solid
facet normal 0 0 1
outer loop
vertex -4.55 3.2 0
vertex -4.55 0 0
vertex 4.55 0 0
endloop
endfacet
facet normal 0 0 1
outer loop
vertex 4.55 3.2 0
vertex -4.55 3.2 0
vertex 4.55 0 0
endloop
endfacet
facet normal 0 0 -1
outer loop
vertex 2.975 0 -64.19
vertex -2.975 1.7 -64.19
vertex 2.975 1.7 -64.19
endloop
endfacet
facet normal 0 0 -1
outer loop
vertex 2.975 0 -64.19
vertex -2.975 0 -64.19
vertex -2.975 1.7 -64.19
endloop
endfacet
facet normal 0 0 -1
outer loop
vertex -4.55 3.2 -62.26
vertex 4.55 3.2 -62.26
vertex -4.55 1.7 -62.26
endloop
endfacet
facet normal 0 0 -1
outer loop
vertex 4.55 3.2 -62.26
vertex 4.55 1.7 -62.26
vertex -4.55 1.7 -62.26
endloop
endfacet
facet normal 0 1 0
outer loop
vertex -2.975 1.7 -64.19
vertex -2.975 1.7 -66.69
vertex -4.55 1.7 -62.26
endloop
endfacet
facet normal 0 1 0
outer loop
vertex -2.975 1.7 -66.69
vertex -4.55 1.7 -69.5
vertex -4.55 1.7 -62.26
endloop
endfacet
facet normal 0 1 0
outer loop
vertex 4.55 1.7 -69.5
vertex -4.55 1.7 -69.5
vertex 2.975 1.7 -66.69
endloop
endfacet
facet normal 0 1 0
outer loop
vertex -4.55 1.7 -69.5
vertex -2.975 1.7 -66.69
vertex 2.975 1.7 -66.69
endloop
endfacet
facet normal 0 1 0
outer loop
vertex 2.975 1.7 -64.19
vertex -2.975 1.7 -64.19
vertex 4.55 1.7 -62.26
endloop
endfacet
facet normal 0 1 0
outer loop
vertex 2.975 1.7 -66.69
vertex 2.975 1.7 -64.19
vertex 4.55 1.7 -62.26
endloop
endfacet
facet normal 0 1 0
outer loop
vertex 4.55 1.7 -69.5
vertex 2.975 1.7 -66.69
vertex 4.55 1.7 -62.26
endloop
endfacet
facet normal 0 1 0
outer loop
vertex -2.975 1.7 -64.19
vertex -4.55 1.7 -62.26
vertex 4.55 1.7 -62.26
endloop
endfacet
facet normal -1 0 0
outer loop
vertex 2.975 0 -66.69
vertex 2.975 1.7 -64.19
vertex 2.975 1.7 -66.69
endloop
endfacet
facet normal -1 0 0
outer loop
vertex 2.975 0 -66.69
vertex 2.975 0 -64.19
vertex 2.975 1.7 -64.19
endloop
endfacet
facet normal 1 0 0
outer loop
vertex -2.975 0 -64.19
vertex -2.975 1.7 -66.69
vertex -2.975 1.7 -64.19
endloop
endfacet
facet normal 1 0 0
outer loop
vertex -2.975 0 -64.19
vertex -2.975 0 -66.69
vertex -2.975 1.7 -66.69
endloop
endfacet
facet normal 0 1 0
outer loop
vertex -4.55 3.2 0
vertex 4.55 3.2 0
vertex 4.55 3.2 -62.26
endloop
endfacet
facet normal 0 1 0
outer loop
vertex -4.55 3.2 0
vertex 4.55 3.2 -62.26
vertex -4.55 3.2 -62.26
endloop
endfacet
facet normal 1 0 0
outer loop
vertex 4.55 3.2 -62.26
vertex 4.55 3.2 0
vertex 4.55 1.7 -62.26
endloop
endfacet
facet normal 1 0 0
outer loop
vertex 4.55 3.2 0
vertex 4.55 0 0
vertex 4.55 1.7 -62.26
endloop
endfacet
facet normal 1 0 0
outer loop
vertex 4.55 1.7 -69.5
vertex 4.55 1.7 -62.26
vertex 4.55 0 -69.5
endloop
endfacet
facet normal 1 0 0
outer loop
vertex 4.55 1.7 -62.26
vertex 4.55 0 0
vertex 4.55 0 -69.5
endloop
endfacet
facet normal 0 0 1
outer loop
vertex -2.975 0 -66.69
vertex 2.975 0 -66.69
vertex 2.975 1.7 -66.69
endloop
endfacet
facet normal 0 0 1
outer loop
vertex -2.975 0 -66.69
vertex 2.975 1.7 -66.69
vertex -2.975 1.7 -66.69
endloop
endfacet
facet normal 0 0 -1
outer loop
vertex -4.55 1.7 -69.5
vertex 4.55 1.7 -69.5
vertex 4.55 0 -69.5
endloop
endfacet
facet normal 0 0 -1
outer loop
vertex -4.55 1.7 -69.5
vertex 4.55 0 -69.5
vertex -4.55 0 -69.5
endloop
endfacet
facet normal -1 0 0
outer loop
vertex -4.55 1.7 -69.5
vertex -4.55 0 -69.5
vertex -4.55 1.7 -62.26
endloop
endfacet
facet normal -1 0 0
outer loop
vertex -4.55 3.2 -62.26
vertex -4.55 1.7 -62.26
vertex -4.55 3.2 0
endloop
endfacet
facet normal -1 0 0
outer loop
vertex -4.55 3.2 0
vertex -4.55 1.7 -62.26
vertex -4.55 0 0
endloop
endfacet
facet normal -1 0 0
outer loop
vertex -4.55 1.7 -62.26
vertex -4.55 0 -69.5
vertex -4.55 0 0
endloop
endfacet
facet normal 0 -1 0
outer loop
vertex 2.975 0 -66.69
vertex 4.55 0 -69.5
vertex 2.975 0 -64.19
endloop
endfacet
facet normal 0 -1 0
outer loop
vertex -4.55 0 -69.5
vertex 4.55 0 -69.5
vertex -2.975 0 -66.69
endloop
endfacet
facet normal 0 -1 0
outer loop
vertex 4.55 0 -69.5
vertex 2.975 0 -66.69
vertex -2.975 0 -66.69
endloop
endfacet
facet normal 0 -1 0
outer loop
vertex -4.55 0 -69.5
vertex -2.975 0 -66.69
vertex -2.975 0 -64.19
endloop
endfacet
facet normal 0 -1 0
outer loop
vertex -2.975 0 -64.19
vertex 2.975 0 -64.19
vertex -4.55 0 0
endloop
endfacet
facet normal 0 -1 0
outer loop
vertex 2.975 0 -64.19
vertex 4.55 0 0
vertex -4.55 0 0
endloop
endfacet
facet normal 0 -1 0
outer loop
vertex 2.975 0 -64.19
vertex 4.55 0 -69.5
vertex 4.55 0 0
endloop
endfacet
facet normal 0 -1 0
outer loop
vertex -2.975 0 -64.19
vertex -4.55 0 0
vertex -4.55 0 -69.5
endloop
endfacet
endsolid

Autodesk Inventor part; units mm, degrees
ref_plane "YZ Plane" through (0, 0, 0) normal (1, 0, 0) x (0, 1, 0)
ref_plane "XZ Plane" through (0, 0, 0) normal (0, 1, 0) x (-1, 0, 0)
ref_plane "XY Plane" through (0, 0, 0) normal (0, 0, 1) x (1, 0, 0)
sketch "Sketch8" plane through (0, 0, 0) normal (0, 1, 0) x (-1, 0, 0)
  line L0 (4.55, 0) -> (-4.55, 0)
  line L1 (-4.55, 0) -> (-4.55, -62.26)
  line L2 (-4.55, -62.26) -> (4.55, -62.26)
  line L3 (4.55, -62.26) -> (4.55, 0)
  point P0 (0, 0)
  point P1 (0, 0)
  dimension "d46" = 62.26
  dimension "pheight" = 9.1
extrude "Extrusion8" add sketch "Sketch8" along normal blind 3.2
sketch "Sketch9" plane through (4.55, 0, -62.26) normal (0, 0, -1) x (-1, 0, 0)
  line L0 (9.1, 0) -> (9.1, 3.2) projected
  line L1 (0, 0) -> (0, 3.2) projected
  line L2 (9.1, 1.7) -> (0, 1.7)
  line L3 (0, 1.7) -> (0, 0)
  line L4 (0, 0) -> (9.1, 0)
  line L5 (9.1, 0) -> (9.1, 1.7)
  line L6 (0, 3.2) -> (9.1, 3.2) projected
  line L7 (0, 0) -> (9.1, 0) projected
  point P0 (4.55, 0)
  dimension "psnap" = 1.7
  dimension "d65" = 0
extrude "Extrusion9" add sketch "Sketch9" along normal blind 7.24 contours L4 L1 L2 L0
sketch "Sketch10" plane through (-4.55, 0, -62.26) normal (0, 1, 0) x (1, 0, 0)
  line L0 (1.575, 1.93) -> (7.525, 1.93)
  line L1 (7.525, 1.93) -> (7.525, 4.43)
  line L2 (7.525, 4.43) -> (1.575, 4.43)
  line L3 (1.575, 4.43) -> (1.575, 1.93)
  line L4 (0, 7.24) -> (9.1, 7.24) projected
  line L5 (0, -62.26) -> (0, 7.24) projected
  line L6 (9.1, -62.26) -> (9.1, 7.24) projected
  point P0 (4.55, -62.26)
  dimension "phheight" = 5.95
  dimension "phwidth" = 2.5
  dimension "d66" = 2.81
  dimension "d67" = 1.575
  dimension "d68" = 1.575
extrude "Extrusion10" cut sketch "Sketch10" along normal blind 7
equation "\"d68\" = d67"
properties part number "switcher"
